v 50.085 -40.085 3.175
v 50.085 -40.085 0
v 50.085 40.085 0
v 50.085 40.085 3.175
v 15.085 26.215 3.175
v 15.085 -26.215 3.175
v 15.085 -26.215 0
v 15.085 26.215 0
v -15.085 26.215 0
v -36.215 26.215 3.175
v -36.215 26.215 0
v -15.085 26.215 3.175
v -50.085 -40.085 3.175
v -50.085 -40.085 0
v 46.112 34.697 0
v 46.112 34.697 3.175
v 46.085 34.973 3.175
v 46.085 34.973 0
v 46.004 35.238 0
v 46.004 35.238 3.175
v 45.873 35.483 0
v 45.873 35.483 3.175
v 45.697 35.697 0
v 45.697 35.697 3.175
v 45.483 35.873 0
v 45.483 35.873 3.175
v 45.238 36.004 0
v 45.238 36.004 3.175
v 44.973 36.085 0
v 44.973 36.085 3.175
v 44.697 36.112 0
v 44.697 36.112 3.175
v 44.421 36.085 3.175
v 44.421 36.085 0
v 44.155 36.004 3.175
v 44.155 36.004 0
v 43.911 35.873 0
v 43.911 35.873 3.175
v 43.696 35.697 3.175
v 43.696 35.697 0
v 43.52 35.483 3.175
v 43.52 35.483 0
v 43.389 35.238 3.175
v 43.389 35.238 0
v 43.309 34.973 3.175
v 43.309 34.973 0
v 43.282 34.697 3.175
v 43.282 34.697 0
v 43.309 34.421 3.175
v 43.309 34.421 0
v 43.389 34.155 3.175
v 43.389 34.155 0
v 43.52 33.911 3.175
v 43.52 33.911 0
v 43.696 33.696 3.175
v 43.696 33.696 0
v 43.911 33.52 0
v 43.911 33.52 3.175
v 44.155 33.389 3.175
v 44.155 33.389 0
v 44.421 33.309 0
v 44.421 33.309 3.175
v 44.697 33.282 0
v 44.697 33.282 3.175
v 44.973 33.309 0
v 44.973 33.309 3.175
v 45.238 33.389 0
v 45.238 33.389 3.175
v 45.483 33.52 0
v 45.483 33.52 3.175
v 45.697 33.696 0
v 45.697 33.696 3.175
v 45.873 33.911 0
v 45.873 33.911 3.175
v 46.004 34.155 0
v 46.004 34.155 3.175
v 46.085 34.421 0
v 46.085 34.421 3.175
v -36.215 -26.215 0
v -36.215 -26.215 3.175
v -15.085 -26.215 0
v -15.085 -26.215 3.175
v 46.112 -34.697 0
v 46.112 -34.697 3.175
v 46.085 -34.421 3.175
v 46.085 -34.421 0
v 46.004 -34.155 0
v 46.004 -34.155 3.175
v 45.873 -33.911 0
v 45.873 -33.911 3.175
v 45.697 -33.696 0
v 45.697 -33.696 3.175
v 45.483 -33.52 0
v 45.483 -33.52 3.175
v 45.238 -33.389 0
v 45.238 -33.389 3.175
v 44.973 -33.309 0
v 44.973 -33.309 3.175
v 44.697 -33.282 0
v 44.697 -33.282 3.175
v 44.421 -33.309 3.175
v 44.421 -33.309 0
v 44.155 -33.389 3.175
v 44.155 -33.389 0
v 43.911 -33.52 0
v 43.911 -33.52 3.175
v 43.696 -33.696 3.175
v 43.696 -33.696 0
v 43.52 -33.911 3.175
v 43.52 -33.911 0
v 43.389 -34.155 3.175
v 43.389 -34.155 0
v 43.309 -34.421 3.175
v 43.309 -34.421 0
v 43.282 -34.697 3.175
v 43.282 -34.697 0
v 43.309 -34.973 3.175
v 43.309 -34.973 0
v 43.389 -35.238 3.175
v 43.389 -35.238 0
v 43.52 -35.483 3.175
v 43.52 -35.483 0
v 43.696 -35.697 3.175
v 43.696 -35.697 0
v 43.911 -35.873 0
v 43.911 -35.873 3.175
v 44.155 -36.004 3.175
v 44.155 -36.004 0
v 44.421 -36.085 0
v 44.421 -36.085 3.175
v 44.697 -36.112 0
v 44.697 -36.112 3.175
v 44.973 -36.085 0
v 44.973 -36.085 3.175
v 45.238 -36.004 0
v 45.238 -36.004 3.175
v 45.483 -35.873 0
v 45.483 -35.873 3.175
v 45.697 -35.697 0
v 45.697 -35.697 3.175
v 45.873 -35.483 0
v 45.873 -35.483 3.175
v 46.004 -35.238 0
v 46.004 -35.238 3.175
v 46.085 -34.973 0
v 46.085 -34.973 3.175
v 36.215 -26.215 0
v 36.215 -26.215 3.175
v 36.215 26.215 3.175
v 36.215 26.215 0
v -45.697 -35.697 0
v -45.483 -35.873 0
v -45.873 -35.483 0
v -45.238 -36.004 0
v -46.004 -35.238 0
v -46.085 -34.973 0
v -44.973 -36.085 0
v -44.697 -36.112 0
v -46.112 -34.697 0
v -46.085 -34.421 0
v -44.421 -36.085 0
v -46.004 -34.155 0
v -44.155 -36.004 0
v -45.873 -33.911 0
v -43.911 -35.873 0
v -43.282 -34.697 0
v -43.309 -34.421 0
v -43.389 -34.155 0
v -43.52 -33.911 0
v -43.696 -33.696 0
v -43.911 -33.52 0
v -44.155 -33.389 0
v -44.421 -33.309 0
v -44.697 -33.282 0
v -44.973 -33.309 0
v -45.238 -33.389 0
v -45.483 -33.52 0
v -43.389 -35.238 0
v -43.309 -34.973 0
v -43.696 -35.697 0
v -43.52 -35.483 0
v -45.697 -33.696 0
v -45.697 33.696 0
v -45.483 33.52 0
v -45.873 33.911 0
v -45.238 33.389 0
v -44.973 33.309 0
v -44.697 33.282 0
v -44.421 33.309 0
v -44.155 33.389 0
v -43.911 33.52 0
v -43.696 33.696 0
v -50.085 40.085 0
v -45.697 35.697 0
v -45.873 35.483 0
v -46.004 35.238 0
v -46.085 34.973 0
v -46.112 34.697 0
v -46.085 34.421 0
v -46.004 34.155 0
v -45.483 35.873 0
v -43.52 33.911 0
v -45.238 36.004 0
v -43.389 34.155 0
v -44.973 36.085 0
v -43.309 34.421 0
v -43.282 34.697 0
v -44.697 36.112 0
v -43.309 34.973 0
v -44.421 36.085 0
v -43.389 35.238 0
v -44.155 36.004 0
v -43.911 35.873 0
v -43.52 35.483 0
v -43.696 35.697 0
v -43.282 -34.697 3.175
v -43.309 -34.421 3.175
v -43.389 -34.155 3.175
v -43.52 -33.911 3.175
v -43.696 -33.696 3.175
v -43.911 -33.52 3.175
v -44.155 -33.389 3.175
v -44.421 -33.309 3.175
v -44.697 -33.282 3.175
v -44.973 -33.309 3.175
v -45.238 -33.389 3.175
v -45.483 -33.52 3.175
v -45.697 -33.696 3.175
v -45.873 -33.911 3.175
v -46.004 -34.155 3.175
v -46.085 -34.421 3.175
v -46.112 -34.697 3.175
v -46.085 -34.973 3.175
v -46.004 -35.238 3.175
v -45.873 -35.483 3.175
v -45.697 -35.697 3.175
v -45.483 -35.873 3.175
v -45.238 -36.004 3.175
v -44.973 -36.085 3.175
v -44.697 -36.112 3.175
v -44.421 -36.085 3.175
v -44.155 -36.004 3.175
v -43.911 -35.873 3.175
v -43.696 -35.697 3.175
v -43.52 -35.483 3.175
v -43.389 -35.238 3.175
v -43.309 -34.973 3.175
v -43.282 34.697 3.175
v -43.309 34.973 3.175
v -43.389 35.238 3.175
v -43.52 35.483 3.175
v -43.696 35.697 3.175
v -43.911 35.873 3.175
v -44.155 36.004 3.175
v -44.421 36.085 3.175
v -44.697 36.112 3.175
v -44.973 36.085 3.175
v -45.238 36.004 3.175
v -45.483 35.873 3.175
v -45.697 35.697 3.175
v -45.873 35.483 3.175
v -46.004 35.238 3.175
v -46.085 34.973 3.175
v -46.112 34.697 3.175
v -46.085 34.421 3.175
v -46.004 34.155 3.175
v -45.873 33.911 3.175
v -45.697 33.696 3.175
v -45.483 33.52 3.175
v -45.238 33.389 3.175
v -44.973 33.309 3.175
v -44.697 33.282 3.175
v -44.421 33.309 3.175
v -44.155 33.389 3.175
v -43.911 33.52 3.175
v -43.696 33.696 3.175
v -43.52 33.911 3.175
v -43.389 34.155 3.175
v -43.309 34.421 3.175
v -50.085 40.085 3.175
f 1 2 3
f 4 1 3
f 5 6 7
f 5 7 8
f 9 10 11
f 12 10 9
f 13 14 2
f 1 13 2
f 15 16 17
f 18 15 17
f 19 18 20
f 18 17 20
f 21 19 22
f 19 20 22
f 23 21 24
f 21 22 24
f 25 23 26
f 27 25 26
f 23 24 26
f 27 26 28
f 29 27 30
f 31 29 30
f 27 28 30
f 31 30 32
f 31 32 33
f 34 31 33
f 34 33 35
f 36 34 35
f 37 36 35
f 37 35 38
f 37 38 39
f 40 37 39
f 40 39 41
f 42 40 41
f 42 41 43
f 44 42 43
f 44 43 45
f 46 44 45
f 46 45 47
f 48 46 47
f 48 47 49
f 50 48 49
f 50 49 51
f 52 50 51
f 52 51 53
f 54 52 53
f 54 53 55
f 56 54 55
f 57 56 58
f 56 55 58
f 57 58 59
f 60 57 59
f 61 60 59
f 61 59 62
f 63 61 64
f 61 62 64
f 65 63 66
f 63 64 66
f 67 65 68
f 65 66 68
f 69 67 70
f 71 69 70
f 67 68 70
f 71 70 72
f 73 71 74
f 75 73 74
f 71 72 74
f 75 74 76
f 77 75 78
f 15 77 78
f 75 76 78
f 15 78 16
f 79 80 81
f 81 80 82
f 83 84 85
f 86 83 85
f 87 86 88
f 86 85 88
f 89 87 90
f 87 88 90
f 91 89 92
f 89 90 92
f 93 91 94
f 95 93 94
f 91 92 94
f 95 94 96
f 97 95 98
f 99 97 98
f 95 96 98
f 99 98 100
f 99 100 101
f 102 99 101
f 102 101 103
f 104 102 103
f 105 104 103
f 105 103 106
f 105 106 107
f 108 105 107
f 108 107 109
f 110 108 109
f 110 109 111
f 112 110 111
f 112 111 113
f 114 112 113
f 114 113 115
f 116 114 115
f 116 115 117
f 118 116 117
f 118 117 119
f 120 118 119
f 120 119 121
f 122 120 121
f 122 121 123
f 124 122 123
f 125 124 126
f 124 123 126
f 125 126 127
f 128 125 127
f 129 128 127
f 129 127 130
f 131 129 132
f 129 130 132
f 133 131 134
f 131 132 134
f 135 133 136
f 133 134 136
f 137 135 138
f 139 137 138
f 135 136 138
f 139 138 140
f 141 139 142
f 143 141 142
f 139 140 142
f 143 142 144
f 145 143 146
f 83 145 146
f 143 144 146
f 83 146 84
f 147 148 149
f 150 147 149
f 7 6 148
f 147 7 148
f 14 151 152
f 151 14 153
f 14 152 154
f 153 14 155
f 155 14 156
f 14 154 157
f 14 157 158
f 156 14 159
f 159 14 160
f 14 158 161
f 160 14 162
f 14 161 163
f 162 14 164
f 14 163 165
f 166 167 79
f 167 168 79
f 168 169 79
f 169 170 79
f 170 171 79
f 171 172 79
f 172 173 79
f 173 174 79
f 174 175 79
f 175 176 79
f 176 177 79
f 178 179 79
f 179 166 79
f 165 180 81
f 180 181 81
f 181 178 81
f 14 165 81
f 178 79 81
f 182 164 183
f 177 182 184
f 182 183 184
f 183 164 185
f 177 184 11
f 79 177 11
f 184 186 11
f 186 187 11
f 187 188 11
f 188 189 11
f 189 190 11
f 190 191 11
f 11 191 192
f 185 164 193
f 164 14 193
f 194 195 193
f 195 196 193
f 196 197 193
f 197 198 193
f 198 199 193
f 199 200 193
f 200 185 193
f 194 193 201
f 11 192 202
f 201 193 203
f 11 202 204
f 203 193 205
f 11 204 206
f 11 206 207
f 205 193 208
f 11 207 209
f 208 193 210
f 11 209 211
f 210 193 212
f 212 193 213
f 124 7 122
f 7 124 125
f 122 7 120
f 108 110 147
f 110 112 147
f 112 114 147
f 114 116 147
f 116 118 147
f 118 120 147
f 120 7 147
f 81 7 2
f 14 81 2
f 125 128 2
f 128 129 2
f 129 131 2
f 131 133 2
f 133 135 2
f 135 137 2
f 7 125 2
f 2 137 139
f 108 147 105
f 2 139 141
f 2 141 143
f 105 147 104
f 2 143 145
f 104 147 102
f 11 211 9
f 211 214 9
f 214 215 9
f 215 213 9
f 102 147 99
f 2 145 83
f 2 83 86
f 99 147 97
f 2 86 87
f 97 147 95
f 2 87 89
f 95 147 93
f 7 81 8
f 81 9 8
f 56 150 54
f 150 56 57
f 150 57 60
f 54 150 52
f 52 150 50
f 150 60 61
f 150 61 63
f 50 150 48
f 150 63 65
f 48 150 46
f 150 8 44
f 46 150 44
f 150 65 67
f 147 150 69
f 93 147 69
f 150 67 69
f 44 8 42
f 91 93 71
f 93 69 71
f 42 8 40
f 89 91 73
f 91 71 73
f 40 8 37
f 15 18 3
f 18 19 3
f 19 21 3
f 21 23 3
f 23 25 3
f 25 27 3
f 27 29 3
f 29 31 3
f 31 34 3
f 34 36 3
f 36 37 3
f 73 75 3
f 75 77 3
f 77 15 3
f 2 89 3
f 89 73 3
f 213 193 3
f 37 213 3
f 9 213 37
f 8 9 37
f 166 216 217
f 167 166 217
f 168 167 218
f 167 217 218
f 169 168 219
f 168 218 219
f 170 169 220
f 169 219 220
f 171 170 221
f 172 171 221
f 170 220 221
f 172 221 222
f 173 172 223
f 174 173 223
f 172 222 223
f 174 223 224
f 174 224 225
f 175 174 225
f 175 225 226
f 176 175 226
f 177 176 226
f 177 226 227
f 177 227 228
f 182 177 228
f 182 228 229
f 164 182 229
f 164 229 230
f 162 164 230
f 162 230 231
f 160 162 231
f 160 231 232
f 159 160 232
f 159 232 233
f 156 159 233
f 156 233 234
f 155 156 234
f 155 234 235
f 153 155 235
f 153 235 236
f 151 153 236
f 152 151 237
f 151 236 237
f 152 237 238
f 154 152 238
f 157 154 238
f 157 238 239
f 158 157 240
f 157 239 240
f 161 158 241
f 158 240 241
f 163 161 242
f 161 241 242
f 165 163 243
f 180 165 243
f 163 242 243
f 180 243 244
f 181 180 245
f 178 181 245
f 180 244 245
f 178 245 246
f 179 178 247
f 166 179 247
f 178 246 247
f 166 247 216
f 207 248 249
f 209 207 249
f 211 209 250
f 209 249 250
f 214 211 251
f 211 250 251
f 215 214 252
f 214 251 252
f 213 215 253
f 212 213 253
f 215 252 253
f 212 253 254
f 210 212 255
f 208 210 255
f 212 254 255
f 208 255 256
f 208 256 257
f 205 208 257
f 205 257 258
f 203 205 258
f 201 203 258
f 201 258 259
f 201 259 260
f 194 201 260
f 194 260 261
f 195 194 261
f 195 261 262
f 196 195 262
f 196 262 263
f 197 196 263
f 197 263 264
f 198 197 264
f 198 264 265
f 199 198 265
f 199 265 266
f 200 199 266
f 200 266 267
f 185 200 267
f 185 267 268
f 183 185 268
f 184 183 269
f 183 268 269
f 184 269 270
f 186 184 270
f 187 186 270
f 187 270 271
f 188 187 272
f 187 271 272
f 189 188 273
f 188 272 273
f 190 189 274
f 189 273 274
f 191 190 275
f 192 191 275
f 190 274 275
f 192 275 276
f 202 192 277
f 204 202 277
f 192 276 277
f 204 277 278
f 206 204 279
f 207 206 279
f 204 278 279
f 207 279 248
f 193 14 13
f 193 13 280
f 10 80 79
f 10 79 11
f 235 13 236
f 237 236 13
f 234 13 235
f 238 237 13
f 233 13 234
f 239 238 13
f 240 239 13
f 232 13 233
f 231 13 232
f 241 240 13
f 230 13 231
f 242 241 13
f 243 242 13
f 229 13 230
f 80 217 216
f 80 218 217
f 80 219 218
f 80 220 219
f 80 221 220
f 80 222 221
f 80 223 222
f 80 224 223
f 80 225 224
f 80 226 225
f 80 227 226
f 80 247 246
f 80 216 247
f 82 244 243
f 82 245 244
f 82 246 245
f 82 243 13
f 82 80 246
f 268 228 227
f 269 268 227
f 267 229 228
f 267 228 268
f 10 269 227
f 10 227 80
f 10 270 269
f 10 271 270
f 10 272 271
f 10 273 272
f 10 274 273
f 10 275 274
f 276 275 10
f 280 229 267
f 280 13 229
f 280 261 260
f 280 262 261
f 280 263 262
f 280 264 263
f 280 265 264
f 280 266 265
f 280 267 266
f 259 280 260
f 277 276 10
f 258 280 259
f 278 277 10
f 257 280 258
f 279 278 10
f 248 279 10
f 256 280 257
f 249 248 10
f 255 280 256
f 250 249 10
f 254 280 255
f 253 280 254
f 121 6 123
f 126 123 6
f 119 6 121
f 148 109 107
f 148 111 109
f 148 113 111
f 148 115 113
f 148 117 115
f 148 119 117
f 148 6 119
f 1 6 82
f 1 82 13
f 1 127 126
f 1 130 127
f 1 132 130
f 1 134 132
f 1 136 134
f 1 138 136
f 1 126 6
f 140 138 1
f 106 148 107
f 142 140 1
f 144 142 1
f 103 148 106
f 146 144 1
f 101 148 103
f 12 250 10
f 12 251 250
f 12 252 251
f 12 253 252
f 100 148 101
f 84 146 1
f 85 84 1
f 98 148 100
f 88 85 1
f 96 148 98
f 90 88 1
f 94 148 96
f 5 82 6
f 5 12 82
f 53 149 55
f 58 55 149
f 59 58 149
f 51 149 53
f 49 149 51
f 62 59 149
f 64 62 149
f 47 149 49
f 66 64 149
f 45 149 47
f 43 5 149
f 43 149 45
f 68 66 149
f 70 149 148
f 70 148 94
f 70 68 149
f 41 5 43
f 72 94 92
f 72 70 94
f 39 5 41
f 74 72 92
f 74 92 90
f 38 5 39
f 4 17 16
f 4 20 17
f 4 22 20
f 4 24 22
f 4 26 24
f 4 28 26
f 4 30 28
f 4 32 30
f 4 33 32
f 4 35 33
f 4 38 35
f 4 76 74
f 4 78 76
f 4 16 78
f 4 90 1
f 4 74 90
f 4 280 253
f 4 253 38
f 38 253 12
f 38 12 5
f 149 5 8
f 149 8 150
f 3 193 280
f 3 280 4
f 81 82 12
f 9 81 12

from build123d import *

# Parameters (mm, degrees)
SKETCH1_W           = 100.17
SKETCH1_H           = 80.17
BOSS_EXTRUDE1_DEPTH = 3.175
SKETCH3_R           = 1.415
CUT_EXTRUDE2_DEPTH  = 4.175
SKETCH2_W           = 21.13
SKETCH2_H           = 52.43
CUT_EXTRUDE4_DEPTH  = 10


with BuildPart() as part:
    # Sketch1 → Boss-Extrude1 (new body)
    with BuildSketch(Plane.XY):
        Rectangle(SKETCH1_W, SKETCH1_H)
    extrude(amount=BOSS_EXTRUDE1_DEPTH)

    # Sketch3 → Cut-Extrude2 (cut, through all)
    with BuildSketch(Plane.XY.offset(3.175)):
        with Locations((-44.696699141, 34.696699141)):
            Circle(SKETCH3_R)
        with Locations((44.696699141, 34.696699141)):
            Circle(SKETCH3_R)
        with Locations((44.696699141, -34.696699141)):
            Circle(SKETCH3_R)
        with Locations((-44.696699141, -34.696699141)):
            Circle(SKETCH3_R)
    extrude(amount=-CUT_EXTRUDE2_DEPTH, mode=Mode.SUBTRACT)

    # Sketch2 → Cut-Extrude4 (cut)
    with BuildSketch(Plane.XY.offset(3.175)):
        with Locations((25.65, 0)):
            Rectangle(SKETCH2_W, SKETCH2_H)
        with Locations((-25.65, 0)):
            Rectangle(SKETCH2_W, SKETCH2_H)
    extrude(amount=-CUT_EXTRUDE4_DEPTH, mode=Mode.SUBTRACT)


solid = part.part
